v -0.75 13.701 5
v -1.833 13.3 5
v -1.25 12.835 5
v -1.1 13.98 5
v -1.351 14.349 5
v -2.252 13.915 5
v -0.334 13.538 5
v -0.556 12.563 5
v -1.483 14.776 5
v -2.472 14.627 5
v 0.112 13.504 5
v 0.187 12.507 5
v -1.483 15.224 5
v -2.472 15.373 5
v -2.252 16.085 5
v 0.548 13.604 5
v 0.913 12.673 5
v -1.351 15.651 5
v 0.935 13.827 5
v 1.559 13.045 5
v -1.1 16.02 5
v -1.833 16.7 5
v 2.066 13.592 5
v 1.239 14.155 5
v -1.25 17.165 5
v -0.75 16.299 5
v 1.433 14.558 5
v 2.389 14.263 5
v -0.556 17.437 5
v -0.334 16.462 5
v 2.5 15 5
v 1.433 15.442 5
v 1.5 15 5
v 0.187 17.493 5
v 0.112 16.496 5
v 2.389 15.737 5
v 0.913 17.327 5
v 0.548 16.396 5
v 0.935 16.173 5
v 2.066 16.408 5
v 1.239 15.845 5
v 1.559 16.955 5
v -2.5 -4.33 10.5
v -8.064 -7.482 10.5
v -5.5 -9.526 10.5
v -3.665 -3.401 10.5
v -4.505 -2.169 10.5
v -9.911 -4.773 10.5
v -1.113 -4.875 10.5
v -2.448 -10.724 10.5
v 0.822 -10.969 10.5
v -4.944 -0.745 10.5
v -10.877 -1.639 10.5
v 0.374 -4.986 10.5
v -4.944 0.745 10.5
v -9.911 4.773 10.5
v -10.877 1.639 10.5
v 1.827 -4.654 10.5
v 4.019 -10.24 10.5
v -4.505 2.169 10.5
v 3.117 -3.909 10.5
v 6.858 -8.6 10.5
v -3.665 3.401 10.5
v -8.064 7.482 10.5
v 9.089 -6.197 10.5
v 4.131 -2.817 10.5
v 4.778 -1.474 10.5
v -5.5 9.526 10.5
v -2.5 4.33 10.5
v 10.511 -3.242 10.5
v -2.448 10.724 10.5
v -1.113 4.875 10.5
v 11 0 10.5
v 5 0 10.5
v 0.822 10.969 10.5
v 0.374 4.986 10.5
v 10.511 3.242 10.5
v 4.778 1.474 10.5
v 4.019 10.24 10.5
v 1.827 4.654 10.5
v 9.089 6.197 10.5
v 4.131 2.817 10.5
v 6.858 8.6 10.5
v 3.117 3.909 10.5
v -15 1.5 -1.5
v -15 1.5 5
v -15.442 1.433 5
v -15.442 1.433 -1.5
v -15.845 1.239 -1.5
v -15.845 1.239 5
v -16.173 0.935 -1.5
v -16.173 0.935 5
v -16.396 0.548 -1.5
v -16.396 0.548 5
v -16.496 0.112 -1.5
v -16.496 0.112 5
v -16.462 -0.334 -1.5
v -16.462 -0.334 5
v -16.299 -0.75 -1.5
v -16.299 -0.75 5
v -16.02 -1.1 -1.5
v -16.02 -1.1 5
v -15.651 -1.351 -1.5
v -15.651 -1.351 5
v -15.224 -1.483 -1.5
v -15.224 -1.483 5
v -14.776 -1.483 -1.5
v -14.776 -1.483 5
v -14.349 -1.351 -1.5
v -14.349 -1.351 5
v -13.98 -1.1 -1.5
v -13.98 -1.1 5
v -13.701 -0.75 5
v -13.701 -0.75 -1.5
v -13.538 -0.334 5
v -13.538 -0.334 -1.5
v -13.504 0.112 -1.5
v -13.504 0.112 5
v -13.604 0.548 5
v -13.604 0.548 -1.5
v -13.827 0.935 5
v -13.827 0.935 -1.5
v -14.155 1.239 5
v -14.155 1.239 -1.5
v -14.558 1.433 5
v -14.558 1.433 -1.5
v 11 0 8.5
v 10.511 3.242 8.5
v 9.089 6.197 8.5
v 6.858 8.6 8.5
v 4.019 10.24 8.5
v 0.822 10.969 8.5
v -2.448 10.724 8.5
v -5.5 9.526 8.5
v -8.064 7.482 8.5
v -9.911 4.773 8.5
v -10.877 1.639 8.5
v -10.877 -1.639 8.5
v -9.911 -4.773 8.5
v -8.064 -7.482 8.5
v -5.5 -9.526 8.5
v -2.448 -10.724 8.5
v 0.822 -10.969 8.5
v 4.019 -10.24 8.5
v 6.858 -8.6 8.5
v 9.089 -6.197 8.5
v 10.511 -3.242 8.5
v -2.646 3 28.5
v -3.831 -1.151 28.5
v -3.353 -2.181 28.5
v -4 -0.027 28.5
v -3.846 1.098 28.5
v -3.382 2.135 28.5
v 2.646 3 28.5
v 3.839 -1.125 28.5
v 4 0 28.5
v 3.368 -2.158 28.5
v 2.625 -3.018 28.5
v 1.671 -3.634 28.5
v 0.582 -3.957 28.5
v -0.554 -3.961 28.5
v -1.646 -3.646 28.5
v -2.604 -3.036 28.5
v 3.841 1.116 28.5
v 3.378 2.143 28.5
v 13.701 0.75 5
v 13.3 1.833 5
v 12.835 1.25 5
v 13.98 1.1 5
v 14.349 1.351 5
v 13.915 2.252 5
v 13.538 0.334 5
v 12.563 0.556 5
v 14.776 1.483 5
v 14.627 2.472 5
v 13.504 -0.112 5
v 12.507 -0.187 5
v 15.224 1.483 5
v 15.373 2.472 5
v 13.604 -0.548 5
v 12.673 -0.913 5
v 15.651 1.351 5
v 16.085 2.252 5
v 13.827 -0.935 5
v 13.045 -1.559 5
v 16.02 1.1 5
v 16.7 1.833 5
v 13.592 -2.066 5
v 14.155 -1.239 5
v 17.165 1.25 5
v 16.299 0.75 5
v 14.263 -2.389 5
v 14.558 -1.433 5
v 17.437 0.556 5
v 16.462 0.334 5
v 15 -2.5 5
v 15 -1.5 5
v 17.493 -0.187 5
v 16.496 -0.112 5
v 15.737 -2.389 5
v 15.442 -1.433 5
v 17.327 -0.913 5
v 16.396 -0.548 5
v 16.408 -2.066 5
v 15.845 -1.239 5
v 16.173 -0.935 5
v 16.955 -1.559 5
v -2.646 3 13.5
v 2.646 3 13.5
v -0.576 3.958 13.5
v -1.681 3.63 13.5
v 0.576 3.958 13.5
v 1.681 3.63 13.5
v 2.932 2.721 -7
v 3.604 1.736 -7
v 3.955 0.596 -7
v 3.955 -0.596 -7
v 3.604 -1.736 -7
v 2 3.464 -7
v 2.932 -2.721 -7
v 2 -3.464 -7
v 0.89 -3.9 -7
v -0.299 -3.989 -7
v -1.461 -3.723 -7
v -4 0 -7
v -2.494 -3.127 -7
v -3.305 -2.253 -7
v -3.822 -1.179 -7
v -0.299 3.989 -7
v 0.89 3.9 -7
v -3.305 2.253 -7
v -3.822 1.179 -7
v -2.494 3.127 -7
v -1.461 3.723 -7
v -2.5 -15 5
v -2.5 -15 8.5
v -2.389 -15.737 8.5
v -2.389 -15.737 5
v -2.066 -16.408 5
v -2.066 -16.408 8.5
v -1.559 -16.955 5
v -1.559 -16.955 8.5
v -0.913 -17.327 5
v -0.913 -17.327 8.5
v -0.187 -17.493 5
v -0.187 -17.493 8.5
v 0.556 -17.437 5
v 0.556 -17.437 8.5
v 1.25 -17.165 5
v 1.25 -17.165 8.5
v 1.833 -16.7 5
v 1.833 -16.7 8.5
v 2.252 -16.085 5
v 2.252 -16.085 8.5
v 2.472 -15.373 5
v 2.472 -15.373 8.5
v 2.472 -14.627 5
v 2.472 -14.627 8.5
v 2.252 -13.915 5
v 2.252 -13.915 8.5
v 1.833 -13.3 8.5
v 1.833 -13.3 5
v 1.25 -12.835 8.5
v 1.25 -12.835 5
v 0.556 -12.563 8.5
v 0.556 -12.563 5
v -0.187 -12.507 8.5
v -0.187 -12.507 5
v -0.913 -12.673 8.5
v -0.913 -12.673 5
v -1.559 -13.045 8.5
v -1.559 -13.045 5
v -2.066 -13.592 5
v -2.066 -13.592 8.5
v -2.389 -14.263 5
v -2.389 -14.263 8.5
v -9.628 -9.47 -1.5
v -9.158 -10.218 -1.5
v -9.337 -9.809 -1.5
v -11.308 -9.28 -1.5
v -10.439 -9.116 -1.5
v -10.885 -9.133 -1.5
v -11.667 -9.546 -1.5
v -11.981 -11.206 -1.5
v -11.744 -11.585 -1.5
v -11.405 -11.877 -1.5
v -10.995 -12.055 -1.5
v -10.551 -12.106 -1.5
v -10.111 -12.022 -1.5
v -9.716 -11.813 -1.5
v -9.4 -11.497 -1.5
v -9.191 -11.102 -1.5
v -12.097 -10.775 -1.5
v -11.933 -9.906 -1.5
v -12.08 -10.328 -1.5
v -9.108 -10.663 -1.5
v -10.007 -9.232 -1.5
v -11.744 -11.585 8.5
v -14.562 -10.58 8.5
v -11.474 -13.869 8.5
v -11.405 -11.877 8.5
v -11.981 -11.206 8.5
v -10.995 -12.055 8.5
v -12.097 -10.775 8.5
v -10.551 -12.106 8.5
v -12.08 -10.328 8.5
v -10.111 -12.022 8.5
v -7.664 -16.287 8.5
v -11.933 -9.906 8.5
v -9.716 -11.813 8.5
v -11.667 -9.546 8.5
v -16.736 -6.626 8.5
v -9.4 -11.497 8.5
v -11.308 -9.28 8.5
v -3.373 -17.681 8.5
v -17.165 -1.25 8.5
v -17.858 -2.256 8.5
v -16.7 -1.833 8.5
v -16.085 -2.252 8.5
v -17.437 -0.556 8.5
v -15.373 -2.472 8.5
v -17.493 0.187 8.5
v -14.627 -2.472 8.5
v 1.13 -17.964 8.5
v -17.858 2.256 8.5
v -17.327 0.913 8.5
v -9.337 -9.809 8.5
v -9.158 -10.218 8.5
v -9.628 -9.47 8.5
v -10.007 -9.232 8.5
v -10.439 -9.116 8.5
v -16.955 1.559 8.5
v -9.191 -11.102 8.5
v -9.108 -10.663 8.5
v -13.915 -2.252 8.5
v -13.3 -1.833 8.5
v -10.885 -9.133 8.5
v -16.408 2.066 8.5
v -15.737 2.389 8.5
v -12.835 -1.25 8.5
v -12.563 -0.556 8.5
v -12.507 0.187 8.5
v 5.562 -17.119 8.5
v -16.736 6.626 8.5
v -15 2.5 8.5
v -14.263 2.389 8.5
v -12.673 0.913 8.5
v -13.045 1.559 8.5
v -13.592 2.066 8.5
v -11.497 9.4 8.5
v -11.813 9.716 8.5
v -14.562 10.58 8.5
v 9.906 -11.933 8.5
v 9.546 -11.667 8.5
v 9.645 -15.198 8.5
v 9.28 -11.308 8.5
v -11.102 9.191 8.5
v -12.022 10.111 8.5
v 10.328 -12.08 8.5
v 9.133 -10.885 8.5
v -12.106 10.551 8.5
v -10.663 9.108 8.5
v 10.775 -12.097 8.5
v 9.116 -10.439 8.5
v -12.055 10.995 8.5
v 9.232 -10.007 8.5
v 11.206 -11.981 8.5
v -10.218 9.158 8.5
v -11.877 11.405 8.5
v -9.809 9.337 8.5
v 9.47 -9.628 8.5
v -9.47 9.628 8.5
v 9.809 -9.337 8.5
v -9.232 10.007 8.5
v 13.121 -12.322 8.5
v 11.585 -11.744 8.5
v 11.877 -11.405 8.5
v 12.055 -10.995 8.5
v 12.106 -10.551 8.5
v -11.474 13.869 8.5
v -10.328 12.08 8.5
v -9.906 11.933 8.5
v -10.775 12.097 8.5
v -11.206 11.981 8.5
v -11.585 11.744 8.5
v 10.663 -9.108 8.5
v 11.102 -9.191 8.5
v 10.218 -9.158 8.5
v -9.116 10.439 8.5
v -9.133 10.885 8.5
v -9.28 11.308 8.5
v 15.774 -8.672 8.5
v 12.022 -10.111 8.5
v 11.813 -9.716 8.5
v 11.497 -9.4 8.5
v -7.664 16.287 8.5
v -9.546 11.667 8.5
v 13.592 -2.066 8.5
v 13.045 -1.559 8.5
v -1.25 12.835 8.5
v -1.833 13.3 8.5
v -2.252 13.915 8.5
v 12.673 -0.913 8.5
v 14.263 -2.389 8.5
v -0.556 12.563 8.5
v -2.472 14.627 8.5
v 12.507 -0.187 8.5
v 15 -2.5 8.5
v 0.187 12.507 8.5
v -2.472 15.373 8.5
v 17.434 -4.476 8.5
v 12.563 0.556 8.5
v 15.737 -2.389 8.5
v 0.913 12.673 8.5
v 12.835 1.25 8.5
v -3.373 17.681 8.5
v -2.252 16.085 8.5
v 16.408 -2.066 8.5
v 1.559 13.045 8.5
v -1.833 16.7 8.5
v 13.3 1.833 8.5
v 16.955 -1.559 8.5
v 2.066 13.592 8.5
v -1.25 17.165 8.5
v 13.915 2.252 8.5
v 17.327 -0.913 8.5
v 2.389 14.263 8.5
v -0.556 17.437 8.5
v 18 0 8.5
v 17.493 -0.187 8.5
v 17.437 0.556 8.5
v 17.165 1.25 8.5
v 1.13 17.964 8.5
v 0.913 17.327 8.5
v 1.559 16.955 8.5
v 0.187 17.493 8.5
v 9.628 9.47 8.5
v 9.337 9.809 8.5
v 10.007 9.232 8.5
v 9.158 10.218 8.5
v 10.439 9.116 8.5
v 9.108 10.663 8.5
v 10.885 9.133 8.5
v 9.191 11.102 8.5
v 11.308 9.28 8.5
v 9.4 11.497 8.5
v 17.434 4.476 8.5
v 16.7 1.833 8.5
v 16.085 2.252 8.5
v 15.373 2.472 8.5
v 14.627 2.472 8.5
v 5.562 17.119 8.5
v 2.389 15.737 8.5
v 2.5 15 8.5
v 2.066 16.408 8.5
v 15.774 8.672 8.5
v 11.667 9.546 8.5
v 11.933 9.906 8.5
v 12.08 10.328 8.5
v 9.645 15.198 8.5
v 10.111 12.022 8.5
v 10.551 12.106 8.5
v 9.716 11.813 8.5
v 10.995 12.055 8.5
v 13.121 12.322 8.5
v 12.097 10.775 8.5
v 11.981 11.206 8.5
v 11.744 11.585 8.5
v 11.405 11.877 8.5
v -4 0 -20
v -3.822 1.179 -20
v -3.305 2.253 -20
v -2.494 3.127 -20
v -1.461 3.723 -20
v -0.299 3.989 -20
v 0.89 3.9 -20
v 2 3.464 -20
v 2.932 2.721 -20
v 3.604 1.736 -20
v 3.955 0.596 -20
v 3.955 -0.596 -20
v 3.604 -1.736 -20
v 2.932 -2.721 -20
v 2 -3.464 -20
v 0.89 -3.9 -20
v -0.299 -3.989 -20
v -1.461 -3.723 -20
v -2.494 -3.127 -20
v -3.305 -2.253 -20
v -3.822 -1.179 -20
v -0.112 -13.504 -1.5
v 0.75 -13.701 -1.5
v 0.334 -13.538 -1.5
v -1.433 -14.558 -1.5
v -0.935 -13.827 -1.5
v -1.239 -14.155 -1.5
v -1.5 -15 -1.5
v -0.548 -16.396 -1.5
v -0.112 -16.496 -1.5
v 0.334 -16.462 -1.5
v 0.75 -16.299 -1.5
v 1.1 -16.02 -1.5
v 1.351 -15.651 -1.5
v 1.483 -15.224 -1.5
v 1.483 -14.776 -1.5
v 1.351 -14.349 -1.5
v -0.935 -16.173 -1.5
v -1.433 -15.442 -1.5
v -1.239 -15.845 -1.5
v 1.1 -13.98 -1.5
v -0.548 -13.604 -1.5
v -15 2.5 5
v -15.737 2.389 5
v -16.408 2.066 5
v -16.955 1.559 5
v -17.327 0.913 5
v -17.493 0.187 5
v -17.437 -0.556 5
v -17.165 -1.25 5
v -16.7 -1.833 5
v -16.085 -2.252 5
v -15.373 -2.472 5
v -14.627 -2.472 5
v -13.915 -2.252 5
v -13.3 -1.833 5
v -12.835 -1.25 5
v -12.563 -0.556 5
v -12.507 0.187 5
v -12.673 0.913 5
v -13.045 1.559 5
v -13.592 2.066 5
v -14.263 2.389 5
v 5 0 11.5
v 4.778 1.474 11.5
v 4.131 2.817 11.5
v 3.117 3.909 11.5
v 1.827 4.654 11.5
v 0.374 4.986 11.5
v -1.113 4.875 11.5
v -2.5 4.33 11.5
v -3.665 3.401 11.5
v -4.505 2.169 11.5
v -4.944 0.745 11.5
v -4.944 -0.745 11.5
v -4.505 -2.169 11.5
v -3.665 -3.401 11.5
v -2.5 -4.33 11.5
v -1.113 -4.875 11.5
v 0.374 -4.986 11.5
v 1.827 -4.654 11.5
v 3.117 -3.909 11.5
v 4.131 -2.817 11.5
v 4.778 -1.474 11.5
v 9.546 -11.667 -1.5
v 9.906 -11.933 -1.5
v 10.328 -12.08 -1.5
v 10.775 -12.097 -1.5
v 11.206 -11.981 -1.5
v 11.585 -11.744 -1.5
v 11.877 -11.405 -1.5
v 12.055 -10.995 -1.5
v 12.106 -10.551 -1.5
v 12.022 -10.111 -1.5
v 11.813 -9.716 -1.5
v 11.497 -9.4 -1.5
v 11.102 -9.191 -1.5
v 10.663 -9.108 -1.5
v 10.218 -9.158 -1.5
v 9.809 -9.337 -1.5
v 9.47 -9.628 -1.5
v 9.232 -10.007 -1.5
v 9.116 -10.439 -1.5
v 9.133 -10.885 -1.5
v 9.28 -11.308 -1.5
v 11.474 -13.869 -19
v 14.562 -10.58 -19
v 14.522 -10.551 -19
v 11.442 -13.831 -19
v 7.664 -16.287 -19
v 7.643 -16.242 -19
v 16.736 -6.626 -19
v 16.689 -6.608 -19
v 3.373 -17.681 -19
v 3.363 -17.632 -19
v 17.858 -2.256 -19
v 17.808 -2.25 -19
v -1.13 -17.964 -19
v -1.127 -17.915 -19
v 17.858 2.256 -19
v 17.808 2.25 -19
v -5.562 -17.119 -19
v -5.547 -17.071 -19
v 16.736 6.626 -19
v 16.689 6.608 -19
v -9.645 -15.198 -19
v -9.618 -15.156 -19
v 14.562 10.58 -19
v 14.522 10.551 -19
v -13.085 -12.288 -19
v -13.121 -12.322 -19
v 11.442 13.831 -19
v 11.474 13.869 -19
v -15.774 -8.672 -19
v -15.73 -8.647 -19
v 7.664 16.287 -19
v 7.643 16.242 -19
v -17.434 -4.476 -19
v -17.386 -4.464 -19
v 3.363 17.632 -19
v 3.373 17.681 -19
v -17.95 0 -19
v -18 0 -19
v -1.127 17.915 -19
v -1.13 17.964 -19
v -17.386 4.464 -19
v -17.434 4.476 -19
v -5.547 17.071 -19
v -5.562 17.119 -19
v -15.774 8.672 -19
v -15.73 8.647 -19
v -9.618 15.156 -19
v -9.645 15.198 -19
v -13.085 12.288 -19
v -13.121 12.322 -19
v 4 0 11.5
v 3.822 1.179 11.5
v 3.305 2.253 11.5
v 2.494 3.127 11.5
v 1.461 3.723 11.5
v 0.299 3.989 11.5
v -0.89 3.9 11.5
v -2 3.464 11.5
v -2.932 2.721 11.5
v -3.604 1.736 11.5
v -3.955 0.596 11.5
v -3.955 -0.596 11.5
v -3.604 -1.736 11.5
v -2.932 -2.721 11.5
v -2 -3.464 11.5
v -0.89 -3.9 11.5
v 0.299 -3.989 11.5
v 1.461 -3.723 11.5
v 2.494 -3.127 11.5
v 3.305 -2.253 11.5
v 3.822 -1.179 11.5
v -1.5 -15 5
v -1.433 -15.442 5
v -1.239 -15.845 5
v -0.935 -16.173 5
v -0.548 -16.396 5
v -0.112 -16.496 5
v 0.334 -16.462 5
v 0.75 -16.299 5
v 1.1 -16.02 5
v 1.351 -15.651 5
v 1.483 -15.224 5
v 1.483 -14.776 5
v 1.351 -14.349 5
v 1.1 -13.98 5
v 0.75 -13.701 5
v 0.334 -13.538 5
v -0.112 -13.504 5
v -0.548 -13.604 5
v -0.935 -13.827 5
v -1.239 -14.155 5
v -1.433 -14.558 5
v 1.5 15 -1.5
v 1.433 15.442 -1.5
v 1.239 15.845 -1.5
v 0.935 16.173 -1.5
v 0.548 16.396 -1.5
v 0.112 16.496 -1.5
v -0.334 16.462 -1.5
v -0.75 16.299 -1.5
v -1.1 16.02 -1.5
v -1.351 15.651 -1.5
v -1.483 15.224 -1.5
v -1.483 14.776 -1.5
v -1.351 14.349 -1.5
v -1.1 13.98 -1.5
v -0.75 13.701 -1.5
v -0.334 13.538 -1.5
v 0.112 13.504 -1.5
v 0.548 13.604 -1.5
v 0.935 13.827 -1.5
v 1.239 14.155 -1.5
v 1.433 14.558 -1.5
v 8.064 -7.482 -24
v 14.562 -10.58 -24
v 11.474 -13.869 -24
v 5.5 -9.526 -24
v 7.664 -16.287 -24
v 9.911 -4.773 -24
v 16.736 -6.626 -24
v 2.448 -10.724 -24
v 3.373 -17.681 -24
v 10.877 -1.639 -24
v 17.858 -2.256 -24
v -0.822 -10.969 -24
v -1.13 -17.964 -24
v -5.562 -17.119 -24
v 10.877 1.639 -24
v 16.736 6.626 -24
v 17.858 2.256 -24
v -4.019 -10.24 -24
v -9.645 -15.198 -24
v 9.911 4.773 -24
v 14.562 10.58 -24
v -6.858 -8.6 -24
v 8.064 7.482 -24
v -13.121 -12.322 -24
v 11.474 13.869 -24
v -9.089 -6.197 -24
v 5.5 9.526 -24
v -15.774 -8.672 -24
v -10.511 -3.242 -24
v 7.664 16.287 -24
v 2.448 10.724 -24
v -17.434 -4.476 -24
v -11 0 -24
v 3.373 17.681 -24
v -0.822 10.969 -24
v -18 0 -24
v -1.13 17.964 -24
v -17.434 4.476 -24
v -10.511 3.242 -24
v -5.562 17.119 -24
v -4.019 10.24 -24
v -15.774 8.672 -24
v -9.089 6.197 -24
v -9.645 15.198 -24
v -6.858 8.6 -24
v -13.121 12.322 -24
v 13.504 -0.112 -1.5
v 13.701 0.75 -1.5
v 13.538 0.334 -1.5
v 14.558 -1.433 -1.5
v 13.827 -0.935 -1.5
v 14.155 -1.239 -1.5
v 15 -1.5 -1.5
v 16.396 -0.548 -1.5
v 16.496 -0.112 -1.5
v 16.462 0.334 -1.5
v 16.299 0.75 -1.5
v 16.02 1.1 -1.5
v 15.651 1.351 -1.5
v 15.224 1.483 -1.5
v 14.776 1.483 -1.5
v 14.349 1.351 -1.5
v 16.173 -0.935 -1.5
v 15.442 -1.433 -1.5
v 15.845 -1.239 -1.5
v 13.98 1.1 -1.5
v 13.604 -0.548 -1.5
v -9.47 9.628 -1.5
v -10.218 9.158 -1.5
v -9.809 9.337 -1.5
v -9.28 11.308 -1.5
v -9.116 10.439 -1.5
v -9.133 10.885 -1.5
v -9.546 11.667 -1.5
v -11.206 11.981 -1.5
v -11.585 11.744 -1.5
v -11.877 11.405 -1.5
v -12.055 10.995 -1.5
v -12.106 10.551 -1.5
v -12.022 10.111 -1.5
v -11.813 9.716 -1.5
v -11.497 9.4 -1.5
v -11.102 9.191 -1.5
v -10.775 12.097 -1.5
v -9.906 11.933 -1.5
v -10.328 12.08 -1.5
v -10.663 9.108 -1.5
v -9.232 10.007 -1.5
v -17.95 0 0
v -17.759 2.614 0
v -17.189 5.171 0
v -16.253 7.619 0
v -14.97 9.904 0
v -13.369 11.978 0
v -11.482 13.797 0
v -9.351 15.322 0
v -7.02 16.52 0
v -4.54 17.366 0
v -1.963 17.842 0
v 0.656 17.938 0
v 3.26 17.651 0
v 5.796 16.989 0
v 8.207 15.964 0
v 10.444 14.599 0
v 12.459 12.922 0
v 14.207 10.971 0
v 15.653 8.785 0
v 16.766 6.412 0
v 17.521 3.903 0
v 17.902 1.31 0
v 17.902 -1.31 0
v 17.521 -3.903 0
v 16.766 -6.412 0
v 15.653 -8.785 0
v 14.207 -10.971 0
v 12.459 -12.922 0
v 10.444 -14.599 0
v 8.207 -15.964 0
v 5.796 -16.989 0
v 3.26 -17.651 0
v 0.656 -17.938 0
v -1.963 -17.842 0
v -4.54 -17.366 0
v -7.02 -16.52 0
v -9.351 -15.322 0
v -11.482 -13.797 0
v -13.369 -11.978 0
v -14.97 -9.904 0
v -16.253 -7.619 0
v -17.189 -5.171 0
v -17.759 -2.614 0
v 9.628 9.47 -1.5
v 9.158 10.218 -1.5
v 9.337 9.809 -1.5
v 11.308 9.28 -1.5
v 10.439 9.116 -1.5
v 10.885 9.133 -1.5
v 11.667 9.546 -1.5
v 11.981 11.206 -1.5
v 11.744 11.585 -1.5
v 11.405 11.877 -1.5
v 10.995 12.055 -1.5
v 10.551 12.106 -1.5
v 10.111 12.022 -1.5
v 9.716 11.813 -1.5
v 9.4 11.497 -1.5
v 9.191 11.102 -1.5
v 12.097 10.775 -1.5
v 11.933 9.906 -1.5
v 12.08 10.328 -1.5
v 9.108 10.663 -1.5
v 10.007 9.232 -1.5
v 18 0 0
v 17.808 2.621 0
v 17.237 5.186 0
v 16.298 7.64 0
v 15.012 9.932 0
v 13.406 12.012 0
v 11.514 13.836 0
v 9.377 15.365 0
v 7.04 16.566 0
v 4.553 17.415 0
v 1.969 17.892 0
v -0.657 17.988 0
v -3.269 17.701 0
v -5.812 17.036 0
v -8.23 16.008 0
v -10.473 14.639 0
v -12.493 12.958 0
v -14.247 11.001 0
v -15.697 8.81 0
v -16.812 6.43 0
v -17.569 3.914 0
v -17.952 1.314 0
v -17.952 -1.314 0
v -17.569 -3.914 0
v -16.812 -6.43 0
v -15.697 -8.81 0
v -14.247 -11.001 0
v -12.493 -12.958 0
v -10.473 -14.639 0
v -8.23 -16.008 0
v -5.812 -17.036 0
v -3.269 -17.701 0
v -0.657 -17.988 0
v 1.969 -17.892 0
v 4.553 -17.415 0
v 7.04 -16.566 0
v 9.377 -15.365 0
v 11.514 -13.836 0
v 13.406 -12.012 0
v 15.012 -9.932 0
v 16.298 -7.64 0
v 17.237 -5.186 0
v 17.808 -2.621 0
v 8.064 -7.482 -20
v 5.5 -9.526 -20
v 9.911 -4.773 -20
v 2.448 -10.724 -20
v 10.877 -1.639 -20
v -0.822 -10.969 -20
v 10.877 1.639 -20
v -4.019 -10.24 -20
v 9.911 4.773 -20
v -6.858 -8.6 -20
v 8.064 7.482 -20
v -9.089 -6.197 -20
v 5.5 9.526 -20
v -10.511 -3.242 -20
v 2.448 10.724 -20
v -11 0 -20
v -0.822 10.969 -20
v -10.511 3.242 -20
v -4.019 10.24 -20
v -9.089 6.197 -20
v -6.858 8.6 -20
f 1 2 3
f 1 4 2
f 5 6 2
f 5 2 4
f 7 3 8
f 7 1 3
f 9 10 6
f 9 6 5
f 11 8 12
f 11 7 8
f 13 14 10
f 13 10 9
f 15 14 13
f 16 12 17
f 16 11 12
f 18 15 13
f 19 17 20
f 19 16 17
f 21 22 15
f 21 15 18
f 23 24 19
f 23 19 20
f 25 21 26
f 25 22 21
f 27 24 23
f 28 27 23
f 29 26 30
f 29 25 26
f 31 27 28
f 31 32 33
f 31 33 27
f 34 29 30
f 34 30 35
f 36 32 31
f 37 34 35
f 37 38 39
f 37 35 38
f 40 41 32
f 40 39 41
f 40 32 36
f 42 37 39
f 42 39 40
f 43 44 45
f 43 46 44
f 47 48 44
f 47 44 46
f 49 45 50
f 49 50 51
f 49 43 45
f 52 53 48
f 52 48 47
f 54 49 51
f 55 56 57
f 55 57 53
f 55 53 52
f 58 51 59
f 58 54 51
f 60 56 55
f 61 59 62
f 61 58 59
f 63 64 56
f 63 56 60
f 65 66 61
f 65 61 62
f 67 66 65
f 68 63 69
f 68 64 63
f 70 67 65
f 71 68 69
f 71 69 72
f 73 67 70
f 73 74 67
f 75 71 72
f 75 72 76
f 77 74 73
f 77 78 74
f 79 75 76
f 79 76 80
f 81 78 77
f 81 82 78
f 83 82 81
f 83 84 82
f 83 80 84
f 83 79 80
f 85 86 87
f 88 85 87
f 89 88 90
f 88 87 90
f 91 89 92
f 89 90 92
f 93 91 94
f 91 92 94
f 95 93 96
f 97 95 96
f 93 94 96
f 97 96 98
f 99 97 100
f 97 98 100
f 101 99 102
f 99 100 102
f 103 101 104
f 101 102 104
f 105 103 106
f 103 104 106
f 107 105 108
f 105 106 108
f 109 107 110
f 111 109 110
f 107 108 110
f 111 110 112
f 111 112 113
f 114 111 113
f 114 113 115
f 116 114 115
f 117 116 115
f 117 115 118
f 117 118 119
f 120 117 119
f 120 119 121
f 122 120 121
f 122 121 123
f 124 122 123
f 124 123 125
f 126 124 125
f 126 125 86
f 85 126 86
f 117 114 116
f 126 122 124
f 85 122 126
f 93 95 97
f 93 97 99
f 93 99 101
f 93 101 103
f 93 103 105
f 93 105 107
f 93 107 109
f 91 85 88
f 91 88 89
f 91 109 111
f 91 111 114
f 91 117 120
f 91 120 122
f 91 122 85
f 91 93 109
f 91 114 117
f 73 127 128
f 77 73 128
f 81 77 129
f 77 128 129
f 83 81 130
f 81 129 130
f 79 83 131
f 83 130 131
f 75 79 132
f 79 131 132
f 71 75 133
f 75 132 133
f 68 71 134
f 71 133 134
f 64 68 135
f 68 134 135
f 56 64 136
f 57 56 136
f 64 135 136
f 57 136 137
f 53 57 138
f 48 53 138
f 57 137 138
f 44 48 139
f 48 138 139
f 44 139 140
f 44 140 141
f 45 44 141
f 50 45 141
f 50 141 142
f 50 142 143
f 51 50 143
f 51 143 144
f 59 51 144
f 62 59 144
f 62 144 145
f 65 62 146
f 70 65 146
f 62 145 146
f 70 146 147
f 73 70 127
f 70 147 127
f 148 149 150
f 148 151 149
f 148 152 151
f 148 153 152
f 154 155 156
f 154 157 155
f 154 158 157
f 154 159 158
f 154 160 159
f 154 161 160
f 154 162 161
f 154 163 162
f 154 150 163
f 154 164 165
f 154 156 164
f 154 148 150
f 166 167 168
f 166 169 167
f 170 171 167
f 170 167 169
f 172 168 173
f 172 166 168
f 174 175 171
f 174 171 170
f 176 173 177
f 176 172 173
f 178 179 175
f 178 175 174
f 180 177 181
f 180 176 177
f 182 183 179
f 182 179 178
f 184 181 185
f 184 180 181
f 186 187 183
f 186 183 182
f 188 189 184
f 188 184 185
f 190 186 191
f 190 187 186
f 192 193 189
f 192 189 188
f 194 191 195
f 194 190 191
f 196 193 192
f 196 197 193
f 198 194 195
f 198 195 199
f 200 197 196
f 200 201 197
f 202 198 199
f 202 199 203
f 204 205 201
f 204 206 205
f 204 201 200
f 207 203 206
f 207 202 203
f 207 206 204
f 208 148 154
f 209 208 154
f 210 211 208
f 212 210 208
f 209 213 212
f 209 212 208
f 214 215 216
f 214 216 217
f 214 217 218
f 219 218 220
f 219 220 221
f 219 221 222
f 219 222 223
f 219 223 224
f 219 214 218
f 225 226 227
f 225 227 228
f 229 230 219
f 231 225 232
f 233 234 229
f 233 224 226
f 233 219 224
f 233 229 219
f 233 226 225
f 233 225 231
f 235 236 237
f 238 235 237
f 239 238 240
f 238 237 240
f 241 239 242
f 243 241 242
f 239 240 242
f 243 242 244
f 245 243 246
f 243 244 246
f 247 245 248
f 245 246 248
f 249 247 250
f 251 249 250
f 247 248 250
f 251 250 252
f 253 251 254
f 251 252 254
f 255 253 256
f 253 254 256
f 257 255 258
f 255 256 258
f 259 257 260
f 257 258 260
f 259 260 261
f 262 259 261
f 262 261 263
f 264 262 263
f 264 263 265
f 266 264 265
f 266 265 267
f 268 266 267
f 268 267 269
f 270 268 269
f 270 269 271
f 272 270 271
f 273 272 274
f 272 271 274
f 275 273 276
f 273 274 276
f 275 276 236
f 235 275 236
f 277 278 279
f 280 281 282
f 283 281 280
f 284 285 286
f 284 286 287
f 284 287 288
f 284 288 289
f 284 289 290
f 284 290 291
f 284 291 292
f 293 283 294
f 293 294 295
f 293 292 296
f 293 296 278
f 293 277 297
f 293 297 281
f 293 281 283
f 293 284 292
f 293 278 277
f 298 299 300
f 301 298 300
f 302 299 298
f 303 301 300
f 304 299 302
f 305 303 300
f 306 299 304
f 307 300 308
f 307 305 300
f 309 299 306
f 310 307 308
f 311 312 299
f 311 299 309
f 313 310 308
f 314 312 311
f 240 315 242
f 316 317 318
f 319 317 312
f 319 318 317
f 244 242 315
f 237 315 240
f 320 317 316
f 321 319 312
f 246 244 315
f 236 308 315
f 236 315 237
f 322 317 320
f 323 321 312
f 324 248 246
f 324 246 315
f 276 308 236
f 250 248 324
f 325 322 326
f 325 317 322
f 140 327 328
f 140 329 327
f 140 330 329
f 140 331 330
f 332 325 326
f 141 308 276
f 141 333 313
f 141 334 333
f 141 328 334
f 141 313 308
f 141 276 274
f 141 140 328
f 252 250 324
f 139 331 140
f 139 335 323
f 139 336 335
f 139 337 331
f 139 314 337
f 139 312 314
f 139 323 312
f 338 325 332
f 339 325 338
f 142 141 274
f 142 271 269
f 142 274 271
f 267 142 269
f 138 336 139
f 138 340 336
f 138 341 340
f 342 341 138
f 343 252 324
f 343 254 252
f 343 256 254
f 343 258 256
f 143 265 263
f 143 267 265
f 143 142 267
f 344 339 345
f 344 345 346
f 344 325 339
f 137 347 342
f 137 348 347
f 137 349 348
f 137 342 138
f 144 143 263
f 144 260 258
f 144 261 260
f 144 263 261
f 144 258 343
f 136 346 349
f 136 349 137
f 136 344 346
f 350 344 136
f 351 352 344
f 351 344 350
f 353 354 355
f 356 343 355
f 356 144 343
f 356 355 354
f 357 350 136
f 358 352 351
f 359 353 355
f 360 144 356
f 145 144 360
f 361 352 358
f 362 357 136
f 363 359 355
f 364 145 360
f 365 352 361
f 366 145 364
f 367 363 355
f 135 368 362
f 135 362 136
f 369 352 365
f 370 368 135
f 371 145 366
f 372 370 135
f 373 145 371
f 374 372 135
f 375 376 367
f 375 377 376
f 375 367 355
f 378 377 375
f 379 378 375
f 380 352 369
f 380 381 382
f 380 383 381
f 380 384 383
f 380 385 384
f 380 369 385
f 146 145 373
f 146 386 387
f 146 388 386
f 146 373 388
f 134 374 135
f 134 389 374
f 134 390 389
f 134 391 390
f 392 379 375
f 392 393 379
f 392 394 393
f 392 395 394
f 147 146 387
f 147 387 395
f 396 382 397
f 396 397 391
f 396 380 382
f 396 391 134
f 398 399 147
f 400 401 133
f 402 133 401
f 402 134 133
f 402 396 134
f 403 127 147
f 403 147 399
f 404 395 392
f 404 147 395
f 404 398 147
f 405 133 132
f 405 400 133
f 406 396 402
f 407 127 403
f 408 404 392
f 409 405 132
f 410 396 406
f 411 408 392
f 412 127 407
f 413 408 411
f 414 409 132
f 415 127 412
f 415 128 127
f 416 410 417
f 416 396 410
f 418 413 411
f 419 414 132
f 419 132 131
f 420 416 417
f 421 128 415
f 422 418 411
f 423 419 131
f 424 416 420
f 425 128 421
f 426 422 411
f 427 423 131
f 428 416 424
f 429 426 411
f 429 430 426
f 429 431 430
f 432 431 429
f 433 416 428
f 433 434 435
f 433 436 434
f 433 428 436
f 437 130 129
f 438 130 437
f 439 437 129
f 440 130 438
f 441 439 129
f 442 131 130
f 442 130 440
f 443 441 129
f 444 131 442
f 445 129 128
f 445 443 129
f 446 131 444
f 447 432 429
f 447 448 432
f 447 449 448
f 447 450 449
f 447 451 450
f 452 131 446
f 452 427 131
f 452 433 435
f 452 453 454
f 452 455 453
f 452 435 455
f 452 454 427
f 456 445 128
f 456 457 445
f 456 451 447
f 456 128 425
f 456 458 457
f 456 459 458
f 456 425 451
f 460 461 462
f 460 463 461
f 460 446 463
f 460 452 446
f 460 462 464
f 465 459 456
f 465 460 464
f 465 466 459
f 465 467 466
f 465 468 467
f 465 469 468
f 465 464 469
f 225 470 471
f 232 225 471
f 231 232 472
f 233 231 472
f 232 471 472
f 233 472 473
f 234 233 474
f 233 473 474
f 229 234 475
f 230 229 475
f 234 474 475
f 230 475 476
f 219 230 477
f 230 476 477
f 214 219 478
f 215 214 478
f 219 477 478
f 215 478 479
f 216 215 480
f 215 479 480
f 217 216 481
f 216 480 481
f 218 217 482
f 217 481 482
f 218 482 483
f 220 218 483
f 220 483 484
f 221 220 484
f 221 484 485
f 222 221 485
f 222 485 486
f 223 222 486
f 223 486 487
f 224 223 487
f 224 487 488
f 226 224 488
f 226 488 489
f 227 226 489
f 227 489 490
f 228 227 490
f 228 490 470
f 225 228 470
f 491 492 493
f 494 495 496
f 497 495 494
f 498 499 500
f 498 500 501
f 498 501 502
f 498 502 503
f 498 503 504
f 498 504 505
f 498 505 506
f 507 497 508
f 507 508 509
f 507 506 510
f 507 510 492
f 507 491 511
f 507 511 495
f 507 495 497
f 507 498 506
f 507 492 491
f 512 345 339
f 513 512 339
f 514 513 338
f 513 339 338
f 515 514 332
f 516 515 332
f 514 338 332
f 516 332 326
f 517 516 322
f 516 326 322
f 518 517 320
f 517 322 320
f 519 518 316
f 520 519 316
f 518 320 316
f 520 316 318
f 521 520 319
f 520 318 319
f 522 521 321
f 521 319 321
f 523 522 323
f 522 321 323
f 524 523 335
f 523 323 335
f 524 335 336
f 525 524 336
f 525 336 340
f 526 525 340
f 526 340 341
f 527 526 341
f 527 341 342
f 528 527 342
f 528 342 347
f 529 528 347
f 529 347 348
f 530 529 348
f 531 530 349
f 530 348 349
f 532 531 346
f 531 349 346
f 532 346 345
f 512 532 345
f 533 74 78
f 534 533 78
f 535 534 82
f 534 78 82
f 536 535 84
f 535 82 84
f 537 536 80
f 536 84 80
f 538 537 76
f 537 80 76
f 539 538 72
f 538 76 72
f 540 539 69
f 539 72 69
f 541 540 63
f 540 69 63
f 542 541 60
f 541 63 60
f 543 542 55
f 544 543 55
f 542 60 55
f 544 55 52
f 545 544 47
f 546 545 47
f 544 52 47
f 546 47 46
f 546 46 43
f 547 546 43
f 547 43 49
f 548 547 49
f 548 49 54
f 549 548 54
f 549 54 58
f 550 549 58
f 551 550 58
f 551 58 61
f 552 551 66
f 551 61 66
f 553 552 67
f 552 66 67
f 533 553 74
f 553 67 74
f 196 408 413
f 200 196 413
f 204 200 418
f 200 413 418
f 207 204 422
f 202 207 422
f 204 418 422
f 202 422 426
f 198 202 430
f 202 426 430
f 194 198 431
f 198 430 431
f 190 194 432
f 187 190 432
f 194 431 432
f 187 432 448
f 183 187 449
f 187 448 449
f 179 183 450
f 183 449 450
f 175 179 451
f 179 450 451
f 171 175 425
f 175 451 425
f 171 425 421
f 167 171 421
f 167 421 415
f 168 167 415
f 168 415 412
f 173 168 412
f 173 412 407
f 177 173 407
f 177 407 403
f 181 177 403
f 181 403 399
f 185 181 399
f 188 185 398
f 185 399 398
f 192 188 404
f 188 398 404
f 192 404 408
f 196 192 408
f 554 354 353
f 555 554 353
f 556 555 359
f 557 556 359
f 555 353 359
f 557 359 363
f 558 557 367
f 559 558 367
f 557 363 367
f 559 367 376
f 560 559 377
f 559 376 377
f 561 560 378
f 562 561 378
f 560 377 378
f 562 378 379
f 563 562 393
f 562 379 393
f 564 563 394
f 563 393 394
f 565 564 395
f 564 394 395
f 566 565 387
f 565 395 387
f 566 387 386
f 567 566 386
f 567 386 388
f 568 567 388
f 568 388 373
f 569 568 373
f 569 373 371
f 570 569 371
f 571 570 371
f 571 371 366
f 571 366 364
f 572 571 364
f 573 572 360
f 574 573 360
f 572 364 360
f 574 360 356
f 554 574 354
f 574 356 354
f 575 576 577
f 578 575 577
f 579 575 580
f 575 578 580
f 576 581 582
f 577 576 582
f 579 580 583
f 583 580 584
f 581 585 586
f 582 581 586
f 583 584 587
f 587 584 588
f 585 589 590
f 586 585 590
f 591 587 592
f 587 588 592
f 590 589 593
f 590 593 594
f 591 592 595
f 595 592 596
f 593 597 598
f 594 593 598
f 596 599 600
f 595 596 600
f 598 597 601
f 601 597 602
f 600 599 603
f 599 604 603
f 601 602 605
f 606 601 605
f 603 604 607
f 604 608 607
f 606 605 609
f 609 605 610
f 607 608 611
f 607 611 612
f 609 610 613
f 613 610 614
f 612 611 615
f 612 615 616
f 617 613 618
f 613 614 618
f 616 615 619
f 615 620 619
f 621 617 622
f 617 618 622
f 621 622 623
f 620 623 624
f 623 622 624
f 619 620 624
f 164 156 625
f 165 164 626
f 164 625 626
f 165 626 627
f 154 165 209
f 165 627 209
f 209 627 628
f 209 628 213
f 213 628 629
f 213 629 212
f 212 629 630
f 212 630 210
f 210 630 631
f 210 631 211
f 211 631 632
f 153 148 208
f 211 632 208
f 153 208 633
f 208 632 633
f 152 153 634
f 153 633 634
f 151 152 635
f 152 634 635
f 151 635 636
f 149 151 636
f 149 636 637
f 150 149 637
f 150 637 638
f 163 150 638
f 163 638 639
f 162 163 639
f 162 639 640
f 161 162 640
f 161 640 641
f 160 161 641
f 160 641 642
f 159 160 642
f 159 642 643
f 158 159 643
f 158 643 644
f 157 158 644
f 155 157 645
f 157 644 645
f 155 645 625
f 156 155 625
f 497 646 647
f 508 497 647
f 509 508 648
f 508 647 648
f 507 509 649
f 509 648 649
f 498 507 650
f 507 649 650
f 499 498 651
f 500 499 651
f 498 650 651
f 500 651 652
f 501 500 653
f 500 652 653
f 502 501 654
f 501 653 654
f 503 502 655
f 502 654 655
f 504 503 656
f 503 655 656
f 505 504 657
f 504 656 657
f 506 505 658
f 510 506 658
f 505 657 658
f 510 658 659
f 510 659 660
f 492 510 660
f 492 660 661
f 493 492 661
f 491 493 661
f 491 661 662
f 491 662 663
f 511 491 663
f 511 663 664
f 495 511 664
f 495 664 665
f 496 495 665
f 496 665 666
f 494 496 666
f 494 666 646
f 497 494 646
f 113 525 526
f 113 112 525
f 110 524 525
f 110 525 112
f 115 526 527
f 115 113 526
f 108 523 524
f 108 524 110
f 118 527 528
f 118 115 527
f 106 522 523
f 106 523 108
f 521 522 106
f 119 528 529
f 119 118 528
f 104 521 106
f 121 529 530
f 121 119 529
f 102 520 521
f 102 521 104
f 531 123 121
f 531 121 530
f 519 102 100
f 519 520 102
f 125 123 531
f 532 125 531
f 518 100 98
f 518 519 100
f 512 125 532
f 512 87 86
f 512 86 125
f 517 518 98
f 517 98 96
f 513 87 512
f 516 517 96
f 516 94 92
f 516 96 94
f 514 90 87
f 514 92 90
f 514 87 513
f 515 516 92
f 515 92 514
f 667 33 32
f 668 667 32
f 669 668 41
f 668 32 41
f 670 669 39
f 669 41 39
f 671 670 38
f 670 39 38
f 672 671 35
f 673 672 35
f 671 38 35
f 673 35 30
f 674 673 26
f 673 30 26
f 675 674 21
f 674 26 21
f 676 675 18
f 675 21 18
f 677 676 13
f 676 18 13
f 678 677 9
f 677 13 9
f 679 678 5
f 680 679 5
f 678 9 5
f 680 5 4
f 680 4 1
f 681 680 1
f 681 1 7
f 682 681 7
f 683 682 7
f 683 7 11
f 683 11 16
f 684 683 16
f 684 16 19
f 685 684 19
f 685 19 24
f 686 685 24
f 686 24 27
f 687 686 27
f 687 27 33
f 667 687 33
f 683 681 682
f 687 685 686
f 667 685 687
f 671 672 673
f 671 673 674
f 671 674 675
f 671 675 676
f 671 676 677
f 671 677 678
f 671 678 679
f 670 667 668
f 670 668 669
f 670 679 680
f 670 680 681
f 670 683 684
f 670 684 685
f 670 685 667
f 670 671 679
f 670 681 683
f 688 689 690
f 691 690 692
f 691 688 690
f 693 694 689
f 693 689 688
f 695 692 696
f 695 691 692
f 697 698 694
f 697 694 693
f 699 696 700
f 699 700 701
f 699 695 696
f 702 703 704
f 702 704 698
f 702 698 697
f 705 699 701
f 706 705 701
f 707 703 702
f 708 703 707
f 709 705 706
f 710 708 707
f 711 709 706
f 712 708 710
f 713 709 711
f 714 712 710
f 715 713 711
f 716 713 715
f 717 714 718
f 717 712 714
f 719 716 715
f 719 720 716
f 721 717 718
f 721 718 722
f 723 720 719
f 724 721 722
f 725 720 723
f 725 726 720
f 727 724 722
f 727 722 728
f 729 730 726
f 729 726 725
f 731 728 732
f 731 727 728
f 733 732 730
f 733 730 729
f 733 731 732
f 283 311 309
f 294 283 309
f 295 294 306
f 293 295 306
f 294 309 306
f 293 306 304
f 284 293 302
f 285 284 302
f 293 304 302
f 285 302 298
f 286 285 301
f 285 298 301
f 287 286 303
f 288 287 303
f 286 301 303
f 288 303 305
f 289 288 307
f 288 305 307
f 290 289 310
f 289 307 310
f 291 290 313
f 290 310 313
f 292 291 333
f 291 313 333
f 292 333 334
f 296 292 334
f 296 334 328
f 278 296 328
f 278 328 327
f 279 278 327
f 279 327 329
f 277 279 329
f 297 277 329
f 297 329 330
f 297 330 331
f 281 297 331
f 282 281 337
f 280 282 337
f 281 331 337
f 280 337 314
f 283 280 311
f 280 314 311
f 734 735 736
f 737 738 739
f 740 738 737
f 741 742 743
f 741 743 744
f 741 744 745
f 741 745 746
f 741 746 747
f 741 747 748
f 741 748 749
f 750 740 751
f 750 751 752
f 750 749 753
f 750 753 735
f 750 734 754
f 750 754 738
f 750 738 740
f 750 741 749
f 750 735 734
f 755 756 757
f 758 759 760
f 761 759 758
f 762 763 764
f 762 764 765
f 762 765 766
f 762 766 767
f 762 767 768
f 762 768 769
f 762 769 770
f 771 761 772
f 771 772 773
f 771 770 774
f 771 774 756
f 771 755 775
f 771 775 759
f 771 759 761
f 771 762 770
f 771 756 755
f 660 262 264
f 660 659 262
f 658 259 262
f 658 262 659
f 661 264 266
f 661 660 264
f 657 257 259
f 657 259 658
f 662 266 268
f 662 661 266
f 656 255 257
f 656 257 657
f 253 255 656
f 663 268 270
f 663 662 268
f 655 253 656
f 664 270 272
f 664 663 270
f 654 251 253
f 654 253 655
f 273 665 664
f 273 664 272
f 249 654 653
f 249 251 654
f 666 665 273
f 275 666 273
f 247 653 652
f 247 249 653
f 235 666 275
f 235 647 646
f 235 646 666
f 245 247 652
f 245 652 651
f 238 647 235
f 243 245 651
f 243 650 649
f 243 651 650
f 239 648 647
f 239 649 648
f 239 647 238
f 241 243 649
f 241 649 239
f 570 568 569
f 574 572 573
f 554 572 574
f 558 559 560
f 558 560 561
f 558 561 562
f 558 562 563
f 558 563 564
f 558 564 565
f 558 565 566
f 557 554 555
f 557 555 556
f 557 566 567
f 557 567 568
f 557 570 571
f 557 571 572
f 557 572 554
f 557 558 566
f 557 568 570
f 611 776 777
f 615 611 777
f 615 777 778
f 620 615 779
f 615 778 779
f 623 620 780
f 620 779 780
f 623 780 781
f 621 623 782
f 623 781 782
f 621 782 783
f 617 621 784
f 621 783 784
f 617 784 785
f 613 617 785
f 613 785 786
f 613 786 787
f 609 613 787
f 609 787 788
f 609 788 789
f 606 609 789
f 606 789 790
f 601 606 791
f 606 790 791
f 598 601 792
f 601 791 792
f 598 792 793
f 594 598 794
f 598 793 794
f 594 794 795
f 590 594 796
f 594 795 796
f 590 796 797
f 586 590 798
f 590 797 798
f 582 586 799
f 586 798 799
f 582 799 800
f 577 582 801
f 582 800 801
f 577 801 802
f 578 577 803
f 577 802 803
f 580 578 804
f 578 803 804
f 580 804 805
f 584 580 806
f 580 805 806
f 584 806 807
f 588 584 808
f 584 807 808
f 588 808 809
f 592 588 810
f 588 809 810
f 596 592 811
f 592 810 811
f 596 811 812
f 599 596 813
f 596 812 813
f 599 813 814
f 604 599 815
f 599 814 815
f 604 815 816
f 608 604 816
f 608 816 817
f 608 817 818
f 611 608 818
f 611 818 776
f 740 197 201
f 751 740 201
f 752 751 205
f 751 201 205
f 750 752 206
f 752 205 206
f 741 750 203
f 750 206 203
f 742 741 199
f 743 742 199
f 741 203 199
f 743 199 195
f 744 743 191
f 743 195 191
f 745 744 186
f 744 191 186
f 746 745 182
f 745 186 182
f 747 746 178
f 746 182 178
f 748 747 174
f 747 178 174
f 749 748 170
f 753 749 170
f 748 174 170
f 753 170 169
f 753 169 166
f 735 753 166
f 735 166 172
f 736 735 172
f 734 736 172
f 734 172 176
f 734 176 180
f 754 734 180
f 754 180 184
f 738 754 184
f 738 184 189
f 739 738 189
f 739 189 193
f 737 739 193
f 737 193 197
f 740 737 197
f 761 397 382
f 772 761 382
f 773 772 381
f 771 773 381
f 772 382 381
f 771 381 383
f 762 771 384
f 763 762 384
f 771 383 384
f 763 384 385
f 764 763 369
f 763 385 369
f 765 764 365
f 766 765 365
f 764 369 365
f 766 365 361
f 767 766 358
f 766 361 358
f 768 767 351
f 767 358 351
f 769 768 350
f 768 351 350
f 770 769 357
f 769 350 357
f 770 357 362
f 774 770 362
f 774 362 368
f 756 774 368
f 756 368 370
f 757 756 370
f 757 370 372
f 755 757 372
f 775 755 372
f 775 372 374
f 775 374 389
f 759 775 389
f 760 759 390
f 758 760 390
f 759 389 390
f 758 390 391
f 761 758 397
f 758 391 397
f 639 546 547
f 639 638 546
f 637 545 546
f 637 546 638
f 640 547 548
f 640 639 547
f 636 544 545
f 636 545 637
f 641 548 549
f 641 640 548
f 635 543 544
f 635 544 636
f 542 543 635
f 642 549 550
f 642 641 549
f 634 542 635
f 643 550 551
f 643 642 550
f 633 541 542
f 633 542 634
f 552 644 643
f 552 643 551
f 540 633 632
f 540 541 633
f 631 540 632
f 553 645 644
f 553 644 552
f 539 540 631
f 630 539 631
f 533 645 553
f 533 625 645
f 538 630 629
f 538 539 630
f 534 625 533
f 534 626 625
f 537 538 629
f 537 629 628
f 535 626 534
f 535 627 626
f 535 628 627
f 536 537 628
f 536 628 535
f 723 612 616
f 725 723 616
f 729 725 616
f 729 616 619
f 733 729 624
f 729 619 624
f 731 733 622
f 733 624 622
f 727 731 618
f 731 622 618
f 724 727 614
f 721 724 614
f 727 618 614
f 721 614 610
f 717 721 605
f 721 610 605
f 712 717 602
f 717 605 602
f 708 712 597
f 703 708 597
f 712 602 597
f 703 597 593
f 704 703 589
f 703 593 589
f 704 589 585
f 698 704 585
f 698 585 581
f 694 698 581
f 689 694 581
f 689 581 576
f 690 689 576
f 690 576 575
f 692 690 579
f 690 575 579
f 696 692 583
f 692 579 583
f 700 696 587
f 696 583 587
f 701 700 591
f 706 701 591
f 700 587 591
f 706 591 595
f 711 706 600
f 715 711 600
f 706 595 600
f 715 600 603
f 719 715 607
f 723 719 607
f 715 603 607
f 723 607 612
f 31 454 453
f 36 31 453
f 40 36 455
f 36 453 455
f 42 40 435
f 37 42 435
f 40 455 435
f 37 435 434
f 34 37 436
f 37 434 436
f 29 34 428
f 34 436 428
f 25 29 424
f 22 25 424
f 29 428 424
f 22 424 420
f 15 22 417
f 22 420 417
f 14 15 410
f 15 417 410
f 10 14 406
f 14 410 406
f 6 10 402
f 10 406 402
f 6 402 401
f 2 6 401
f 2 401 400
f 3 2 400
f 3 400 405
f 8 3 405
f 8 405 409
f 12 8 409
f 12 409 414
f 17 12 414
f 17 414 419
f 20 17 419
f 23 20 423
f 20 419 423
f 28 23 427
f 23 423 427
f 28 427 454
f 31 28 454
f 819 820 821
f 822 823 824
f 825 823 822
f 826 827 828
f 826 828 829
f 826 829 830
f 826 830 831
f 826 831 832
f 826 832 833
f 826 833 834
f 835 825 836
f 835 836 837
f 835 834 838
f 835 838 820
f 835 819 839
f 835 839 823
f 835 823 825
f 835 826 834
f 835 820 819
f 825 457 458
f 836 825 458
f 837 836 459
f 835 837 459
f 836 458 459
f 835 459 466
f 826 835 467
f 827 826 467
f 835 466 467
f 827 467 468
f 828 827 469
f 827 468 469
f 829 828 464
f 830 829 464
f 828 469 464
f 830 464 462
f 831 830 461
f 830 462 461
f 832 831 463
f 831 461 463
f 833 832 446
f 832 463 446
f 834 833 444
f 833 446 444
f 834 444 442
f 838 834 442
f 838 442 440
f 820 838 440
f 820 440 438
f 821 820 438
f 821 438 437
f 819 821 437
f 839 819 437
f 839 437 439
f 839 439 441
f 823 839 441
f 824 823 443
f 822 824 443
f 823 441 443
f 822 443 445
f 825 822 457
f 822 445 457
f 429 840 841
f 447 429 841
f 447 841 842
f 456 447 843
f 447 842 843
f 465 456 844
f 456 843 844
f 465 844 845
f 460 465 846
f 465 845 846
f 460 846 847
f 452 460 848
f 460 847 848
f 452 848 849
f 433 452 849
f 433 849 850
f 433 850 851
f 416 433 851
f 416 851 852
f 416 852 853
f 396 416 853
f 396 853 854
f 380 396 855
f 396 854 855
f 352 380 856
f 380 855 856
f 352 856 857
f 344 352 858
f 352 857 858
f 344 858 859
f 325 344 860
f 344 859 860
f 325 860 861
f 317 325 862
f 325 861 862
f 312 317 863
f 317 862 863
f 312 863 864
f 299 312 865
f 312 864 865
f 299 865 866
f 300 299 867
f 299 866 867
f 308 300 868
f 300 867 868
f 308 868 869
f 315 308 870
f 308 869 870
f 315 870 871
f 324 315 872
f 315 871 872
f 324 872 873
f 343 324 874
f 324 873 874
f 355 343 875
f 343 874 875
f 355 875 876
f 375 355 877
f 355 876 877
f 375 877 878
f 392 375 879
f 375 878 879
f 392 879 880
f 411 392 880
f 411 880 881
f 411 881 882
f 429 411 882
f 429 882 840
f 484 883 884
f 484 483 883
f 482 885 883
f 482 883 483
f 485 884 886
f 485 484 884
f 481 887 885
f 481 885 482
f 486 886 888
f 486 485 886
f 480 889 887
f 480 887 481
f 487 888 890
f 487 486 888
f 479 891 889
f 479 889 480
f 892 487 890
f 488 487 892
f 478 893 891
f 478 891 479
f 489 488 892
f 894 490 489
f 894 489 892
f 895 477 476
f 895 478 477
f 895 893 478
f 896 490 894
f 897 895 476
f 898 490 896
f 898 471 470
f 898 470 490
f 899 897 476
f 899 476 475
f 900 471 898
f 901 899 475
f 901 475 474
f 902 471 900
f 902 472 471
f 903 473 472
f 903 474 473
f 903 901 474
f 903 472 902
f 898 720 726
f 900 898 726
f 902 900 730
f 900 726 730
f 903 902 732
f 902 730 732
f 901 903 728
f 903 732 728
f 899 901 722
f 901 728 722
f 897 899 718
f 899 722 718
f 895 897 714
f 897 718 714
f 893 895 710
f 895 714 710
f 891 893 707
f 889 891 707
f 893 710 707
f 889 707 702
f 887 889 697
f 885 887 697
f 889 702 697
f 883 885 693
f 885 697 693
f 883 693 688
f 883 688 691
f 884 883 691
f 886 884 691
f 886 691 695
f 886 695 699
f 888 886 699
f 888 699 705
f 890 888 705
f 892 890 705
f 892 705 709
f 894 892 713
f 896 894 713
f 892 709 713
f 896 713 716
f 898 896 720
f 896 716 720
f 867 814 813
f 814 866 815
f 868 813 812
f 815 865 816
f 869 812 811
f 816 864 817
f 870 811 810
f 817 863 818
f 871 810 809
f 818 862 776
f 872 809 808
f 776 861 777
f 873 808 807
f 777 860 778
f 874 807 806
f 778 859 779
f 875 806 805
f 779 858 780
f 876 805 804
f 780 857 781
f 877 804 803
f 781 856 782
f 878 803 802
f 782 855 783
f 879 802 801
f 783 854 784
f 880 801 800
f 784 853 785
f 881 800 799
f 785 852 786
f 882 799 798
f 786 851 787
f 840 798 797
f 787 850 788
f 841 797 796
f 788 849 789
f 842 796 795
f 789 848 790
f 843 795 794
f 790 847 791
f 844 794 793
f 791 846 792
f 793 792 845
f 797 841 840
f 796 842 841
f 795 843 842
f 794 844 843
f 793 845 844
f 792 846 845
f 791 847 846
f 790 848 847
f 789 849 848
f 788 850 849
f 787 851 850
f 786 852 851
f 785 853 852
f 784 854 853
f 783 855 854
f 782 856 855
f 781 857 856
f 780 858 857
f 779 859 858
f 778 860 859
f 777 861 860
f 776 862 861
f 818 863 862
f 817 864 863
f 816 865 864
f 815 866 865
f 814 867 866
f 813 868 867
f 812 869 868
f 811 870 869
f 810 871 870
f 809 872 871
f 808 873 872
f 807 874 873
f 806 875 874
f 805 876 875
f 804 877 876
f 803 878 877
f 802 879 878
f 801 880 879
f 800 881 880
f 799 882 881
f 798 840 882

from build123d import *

# Parameters (mm, degrees)
SKETCH_1_R               = 18
EXTRUDE_1_DEPTH          = 8.5
SKETCH_2_R               = 17.95
EXTRUDE_2_DEPTH          = 19
SKETCH_3_R               = 18
EXTRUDE_3_DEPTH          = 5
SKETCH_4_R               = 11
EXTRUDE_4_DEPTH          = 2
SKETCH_5_R               = 5
EXTRUDE_5_DEPTH          = 1
SKETCH_6_R               = 4
EXTRUDE_6_DEPTH          = 17
CUT_EXTRUDE_1_DEPTH      = 1
CUT_EXTRUDE_1_DEPTH_BACK = 15
SKETCH_8_R               = 11
CUT_EXTRUDE_2_DEPTH      = 4
SKETCH_9_R               = 4
CUT_EXTRUDE_3_DEPTH      = 17
SKETCH_10_R              = 1.5
CUT_EXTRUDE_4_DEPTH      = 10
PATTERN_CIRCULAR_1_COUNT = 8
SKETCH_11_R              = 2.5
CUT_EXTRUDE_5_DEPTH      = 3.5
PATTERN_CIRCULAR_2_COUNT = 4


with BuildPart() as part:
    # 草圖1 → 填料-伸長1 (new body)
    with BuildSketch(Plane.XY):
        Circle(SKETCH_1_R)
    extrude(amount=EXTRUDE_1_DEPTH)

    # 草圖2 → 填料-伸長2 (add)
    with BuildSketch(Plane(origin=(0, 0, 0), x_dir=(-1, 0, 0), z_dir=(0, 0, -1))):
        Circle(SKETCH_2_R)
    extrude(amount=EXTRUDE_2_DEPTH)

    # 草圖3 → 填料-伸長3 (add)
    with BuildSketch(Plane(origin=(0, 0, -19), x_dir=(-1, 0, 0), z_dir=(0, 0, -1))):
        Circle(SKETCH_3_R)
    extrude(amount=EXTRUDE_3_DEPTH)

    # 草圖4 → 填料-伸長4 (add)
    with BuildSketch(Plane.XY.offset(8.5)):
        Circle(SKETCH_4_R)
    extrude(amount=EXTRUDE_4_DEPTH)

    # 草圖5 → 填料-伸長5 (add)
    with BuildSketch(Plane.XY.offset(10.5)):
        Circle(SKETCH_5_R)
    extrude(amount=EXTRUDE_5_DEPTH)

    # 草圖6 → 填料-伸長6 (add)
    with BuildSketch(Plane.XY.offset(11.5)):
        Circle(SKETCH_6_R)
    extrude(amount=EXTRUDE_6_DEPTH)

    # 草圖7 → 除料-伸長1 (cut, two sides)
    with BuildSketch(Plane.XY.offset(28.5)) as cut_extrude_1_sk:
        Polygon((-71.543868334, 3), (-2.645751311, 3), (2.645751311, 3), (71.543868334, 3), (71.543868334, 140.796234045), (-71.543868334, 140.796234045), align=None)
    extrude(amount=CUT_EXTRUDE_1_DEPTH, mode=Mode.SUBTRACT)
    extrude(cut_extrude_1_sk.sketch, amount=-CUT_EXTRUDE_1_DEPTH_BACK, mode=Mode.SUBTRACT)

    # 草圖8 → 除料-伸長2 (cut)
    with BuildSketch(Plane(origin=(0, 0, -24), x_dir=(-1, 0, 0), z_dir=(0, 0, -1))):
        Circle(SKETCH_8_R)
    extrude(amount=-CUT_EXTRUDE_2_DEPTH, mode=Mode.SUBTRACT)

    # 草圖9 → 除料-伸長3 (cut)
    with BuildSketch(Plane(origin=(0, 0, -24), x_dir=(-1, 0, 0), z_dir=(0, 0, -1))):
        Circle(SKETCH_9_R)
    extrude(amount=-CUT_EXTRUDE_3_DEPTH, mode=Mode.SUBTRACT)

    # 草圖10 → 除料-伸長4 (cut)
    with BuildSketch(Plane.XY.offset(8.5)):
        with Locations((0, 15)):
            Circle(SKETCH_10_R)
    cut_extrude_4 = extrude(amount=-CUT_EXTRUDE_4_DEPTH, mode=Mode.SUBTRACT)

    # 環狀複製排列1: 除料-伸長4 ×8 about axis
    pattern_circular_1_axis = Axis((0, 0, 0), (0, 0, 1))
    for i in range(1, PATTERN_CIRCULAR_1_COUNT):
        add(cut_extrude_4.rotate(pattern_circular_1_axis, i * 360 / PATTERN_CIRCULAR_1_COUNT), mode=Mode.SUBTRACT)

    # 草圖11 → 除料-伸長5 (cut)
    with BuildSketch(Plane.XY.offset(8.5)):
        with Locations((0, 15)):
            Circle(SKETCH_11_R)
    cut_extrude_5 = extrude(amount=-CUT_EXTRUDE_5_DEPTH, mode=Mode.SUBTRACT)

    # 環狀複製排列2: 除料-伸長5 ×4 about axis
    pattern_circular_2_axis = Axis((0, 0, 0), (0, 0, 1))
    for i in range(1, PATTERN_CIRCULAR_2_COUNT):
        add(cut_extrude_5.rotate(pattern_circular_2_axis, i * 360 / PATTERN_CIRCULAR_2_COUNT), mode=Mode.SUBTRACT)


solid = part.part
